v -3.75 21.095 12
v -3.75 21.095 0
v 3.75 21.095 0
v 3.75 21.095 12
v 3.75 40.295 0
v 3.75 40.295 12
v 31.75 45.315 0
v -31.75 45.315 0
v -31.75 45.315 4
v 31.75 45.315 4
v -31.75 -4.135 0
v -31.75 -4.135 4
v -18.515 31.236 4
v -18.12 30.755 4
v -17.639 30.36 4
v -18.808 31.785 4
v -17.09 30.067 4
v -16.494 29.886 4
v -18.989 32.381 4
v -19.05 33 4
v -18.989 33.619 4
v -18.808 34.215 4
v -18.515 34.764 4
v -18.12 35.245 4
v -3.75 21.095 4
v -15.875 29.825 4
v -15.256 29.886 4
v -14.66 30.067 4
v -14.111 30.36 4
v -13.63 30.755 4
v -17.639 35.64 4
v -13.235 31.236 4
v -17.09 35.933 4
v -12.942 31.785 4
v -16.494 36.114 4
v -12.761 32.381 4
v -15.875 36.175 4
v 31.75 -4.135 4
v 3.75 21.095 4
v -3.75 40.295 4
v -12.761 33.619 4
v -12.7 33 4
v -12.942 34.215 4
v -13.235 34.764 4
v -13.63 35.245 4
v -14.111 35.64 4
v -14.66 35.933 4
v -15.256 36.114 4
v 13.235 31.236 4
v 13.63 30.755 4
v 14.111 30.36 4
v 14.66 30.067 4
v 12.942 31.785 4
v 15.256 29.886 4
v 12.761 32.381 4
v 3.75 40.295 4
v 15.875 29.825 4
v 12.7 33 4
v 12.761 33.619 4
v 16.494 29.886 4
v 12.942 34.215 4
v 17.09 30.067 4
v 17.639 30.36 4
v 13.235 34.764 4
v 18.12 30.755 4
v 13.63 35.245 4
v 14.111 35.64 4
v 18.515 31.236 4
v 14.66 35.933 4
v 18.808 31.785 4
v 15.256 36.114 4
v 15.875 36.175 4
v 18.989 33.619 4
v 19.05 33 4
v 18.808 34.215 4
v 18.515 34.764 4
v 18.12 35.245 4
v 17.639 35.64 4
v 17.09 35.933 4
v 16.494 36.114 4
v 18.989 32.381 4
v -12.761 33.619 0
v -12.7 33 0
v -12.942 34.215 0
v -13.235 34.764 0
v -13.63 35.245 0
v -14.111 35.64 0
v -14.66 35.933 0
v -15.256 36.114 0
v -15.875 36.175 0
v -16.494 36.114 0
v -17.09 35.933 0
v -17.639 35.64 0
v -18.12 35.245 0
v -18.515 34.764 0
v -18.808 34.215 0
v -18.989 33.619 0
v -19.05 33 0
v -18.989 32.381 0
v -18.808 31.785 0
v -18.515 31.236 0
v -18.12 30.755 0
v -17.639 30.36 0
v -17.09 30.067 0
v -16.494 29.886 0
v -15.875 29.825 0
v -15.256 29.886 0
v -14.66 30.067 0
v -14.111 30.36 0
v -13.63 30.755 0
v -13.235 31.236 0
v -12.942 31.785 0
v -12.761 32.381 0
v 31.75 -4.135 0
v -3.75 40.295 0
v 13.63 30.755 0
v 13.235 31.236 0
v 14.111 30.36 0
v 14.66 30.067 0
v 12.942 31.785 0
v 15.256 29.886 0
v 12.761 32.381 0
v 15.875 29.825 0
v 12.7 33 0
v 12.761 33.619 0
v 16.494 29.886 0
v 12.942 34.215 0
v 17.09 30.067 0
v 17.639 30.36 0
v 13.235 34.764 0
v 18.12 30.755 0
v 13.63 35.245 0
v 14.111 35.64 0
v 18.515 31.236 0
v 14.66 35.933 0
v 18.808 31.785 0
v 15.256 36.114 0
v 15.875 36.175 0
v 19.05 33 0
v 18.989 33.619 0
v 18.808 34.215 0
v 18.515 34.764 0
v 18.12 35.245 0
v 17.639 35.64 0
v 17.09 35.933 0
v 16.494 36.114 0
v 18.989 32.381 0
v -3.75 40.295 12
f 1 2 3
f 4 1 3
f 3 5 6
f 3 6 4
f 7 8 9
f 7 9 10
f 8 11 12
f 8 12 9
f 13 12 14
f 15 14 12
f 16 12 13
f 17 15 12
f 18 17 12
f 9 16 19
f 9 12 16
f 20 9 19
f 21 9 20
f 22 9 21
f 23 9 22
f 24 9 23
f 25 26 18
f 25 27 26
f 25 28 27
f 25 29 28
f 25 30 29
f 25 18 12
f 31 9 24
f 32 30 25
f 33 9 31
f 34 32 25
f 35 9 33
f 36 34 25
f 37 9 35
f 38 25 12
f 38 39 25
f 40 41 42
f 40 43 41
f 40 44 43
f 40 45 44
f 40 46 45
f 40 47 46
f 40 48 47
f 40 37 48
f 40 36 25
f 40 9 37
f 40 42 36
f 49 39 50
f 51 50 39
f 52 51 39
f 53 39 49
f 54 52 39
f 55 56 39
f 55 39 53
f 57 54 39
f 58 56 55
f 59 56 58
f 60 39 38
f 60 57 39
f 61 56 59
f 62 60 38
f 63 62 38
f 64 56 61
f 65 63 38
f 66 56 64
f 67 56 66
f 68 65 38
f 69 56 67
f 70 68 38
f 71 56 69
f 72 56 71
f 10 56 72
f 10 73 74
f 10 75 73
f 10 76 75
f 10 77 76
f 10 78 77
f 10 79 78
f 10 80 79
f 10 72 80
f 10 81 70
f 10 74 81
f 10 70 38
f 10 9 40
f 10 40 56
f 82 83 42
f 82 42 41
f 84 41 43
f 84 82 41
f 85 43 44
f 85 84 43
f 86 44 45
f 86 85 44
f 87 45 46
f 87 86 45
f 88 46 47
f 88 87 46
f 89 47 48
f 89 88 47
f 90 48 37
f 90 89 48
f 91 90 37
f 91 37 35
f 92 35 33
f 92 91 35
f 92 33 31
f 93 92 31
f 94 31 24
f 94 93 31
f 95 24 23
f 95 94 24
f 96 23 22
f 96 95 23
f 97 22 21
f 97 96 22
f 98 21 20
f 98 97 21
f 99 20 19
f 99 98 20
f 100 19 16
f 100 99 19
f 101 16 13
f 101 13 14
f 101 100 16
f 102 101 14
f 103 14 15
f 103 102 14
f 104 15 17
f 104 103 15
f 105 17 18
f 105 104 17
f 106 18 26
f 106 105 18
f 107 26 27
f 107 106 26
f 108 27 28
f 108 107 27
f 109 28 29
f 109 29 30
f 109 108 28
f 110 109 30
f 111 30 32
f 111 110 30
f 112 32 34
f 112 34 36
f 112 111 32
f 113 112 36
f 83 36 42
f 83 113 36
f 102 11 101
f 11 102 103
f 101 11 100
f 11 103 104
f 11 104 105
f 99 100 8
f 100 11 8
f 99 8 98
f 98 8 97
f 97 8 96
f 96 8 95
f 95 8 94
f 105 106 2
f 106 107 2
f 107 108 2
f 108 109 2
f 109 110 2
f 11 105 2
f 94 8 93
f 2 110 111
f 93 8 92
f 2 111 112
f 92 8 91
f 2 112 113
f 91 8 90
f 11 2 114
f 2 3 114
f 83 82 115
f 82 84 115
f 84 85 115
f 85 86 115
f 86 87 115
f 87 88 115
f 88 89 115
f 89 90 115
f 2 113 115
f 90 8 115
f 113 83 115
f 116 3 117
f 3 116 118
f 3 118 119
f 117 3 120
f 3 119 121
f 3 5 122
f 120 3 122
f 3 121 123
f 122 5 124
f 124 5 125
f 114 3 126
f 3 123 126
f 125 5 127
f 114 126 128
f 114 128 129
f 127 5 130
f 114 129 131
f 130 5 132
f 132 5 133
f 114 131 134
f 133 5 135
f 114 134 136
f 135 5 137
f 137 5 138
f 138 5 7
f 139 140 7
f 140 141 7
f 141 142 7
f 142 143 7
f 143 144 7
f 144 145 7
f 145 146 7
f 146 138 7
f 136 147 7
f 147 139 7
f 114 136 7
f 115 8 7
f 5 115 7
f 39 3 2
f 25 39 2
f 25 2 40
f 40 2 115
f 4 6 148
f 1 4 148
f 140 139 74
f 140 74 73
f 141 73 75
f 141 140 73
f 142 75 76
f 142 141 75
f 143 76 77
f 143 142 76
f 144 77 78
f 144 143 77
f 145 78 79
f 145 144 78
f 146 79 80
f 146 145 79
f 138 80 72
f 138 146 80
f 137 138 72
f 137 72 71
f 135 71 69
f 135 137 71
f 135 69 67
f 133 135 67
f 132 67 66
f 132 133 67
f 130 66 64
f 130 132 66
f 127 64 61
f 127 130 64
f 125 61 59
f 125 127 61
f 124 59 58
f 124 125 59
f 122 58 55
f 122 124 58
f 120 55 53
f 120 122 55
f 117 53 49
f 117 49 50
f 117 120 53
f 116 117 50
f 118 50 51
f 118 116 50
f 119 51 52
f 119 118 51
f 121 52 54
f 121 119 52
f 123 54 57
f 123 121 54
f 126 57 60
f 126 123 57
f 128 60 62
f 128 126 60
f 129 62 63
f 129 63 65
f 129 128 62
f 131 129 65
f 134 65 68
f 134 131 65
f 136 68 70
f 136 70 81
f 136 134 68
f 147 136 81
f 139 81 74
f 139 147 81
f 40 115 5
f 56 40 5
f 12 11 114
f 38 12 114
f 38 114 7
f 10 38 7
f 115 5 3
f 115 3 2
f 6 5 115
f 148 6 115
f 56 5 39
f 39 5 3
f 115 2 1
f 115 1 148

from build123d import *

# Parameters (mm, degrees)
SKETCH1_W           = 63.5
SKETCH1_H           = 49.45
SKETCH1_W_2         = 7.5
SKETCH1_H_2         = 19.2
SKETCH1_R           = 3.175
BOSS_EXTRUDE1_DEPTH = 4
BOSS_EXTRUDE2_DEPTH = 12


with BuildPart() as part:
    # Sketch1 → Boss-Extrude1 (new body)
    with BuildSketch(Plane.XY):
        with Locations((0, 20.59)):
            Rectangle(SKETCH1_W, SKETCH1_H)
        with Locations((0, 30.695)):
            Rectangle(SKETCH1_W_2, SKETCH1_H_2, mode=Mode.SUBTRACT)
        with Locations((-15.875, 33)):
            Circle(SKETCH1_R, mode=Mode.SUBTRACT)
        with Locations((15.875, 33)):
            Circle(SKETCH1_R, mode=Mode.SUBTRACT)
    extrude(amount=BOSS_EXTRUDE1_DEPTH)


with BuildPart() as body_2:
    # Sketch1<3> → Boss-Extrude2 (new body)
    with BuildSketch(Plane.XY):
        Polygon((0, 40.295), (-3.75, 40.295), (-3.75, 21.095), (0, 21.095), (3.75, 21.095), (3.75, 40.295), align=None)
    extrude(amount=BOSS_EXTRUDE2_DEPTH)


solid = Compound([part.part, body_2.part])
